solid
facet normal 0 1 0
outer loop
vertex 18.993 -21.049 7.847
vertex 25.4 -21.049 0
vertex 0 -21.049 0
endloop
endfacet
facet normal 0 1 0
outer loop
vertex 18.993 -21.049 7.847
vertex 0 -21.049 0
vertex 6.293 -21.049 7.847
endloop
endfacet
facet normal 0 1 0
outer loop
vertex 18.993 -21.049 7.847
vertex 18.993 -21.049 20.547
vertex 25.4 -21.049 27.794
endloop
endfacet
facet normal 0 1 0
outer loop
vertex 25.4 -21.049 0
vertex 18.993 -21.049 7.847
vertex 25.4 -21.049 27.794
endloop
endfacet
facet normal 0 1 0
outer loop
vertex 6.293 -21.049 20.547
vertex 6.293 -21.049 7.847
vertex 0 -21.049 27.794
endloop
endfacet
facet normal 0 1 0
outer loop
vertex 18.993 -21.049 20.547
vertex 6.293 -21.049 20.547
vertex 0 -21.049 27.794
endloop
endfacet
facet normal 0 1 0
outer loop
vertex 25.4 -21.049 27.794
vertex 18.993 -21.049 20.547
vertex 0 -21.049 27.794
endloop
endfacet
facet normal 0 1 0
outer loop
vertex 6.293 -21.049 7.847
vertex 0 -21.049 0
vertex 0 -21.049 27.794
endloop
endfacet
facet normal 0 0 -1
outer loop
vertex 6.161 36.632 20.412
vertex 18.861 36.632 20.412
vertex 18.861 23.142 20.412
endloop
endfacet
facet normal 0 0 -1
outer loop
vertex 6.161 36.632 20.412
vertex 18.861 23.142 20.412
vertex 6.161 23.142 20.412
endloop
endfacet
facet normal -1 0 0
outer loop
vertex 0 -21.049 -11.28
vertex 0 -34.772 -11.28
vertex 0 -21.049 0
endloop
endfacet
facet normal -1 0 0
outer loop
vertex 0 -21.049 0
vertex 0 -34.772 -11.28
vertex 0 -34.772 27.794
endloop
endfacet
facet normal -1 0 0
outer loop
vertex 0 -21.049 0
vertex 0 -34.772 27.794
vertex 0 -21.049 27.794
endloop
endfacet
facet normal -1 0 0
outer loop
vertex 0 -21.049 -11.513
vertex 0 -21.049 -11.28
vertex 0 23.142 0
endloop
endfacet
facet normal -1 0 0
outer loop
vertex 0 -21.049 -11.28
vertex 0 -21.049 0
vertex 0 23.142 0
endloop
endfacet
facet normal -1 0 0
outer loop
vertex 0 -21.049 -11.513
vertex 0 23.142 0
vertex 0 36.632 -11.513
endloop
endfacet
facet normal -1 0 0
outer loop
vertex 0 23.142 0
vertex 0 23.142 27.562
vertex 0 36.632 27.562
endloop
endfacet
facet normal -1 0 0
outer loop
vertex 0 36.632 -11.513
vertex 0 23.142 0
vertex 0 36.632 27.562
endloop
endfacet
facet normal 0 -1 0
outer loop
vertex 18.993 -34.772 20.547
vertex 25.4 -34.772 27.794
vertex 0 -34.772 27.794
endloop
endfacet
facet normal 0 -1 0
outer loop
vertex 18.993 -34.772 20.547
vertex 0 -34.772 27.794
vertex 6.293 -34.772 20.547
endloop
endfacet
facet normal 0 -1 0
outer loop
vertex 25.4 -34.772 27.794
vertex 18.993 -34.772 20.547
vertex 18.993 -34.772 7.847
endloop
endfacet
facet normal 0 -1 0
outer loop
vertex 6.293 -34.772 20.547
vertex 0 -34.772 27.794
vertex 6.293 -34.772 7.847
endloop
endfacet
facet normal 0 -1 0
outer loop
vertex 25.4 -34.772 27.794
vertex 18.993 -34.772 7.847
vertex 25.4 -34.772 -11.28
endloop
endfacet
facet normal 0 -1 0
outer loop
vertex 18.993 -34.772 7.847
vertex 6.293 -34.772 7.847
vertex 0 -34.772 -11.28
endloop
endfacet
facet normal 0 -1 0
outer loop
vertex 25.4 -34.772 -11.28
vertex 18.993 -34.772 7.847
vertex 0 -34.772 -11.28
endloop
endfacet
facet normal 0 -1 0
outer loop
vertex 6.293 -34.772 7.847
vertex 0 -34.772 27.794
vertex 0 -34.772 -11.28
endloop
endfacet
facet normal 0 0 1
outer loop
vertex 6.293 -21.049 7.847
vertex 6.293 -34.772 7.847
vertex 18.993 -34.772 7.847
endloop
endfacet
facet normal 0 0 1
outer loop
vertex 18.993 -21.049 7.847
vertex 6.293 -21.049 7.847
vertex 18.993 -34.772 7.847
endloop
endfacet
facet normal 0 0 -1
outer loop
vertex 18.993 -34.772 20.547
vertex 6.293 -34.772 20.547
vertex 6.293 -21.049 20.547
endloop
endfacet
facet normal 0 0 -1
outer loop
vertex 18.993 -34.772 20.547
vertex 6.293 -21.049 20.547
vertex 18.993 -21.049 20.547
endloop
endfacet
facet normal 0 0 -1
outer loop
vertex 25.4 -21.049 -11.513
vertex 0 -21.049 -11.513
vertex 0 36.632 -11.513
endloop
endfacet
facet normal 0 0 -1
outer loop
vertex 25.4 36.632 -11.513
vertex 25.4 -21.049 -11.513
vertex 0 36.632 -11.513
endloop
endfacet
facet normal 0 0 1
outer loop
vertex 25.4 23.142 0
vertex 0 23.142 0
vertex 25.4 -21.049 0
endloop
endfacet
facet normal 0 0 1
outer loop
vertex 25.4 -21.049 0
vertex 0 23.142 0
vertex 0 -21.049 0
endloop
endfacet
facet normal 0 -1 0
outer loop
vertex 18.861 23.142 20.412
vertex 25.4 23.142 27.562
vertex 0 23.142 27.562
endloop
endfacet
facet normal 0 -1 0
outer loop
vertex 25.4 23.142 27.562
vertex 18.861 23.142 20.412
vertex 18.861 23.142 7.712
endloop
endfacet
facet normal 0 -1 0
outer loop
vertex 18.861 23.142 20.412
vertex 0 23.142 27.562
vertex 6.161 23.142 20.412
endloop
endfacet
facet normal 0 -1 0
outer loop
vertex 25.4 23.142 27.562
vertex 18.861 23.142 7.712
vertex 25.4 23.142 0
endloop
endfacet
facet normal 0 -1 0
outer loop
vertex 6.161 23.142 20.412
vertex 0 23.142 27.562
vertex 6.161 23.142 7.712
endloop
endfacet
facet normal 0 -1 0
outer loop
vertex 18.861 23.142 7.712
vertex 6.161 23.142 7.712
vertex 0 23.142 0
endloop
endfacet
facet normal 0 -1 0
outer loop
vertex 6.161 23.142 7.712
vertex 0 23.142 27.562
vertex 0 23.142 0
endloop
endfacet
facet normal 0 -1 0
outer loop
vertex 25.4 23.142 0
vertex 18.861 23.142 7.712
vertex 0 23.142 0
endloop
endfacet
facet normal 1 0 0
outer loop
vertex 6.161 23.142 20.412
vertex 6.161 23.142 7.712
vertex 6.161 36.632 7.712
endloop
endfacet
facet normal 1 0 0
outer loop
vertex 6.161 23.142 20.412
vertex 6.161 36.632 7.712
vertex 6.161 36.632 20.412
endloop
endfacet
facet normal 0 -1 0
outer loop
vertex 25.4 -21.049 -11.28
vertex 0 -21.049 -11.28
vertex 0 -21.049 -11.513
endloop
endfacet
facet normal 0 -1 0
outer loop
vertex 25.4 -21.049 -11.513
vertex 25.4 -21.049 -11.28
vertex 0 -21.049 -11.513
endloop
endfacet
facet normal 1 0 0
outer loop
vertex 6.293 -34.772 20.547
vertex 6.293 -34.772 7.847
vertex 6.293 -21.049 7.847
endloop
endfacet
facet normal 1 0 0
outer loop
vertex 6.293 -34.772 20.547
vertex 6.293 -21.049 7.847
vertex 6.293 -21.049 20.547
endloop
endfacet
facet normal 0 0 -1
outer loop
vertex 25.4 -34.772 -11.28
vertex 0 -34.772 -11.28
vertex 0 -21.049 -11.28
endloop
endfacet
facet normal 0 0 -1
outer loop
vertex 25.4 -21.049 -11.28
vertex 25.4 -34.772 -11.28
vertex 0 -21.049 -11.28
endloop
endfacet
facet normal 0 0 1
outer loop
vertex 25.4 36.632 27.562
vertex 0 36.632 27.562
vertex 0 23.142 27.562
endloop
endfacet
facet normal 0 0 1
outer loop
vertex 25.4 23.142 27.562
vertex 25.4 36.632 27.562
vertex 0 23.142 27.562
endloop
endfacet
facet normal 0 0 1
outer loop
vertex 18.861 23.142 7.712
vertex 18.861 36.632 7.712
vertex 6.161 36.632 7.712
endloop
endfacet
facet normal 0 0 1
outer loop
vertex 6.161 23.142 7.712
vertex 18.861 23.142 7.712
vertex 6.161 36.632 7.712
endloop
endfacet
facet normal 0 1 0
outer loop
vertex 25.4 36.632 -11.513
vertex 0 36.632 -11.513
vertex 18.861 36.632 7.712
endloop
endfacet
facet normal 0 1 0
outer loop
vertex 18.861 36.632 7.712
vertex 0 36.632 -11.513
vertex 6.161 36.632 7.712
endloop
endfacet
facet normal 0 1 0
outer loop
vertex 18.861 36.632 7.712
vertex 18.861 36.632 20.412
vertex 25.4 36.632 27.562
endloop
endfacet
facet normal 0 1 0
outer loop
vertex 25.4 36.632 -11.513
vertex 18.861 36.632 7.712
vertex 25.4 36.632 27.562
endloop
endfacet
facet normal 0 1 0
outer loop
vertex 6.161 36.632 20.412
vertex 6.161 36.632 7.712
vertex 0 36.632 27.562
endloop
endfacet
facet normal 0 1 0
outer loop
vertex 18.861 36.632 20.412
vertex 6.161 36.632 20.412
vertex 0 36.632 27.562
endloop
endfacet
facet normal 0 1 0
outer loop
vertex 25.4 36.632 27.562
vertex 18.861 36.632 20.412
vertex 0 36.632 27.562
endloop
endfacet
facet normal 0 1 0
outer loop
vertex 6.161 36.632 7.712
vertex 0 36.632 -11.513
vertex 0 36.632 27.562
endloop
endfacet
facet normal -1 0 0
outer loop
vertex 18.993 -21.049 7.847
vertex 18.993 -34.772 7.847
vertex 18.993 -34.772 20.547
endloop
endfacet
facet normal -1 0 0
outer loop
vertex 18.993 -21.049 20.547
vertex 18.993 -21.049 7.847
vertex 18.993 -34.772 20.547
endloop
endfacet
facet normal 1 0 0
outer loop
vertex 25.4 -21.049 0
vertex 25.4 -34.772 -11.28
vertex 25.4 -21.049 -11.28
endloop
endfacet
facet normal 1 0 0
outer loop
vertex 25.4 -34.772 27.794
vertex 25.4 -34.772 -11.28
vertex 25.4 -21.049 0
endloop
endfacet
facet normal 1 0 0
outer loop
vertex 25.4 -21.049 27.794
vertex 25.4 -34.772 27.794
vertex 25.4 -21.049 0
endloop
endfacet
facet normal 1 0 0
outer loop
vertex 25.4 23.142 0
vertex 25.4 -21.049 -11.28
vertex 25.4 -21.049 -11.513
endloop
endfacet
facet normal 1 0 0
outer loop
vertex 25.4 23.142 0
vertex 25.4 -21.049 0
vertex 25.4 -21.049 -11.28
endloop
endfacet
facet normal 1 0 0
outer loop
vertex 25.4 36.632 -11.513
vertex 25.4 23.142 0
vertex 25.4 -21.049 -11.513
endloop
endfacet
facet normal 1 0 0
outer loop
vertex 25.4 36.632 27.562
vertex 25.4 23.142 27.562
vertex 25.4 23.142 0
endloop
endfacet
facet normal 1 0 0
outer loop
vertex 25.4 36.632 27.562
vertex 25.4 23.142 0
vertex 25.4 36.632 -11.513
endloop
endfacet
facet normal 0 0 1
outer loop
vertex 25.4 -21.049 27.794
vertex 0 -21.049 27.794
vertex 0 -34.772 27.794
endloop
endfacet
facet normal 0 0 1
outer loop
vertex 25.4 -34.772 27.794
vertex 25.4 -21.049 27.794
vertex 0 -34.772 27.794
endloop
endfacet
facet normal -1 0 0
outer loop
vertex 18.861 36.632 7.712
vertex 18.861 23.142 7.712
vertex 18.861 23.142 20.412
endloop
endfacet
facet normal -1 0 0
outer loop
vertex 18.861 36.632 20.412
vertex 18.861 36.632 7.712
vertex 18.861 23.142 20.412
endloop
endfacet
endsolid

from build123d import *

# Parameters (mm, degrees)
F1_DEPTH = 25.4
F2_DEPTH = 25.4
F3_W     = 12.7
F3_H     = 12.7
F4_DEPTH = 50.8
F5_W     = 12.7
F5_H     = 12.7
F6_DEPTH = 50.8


with BuildPart() as f1:
    # F0 (on Right) → F1 (new body)
    with BuildSketch(Plane.YZ):
        Polygon((-21.049142, 27.794171), (-34.771789, 27.794171), (-34.771789, -11.280479), (-21.049142, -11.280479), (-21.049142, -11.513066), (23.142429, -11.513066), (36.632486, -11.513066), (36.632486, 27.561583), (23.142429, 27.561583), (23.142429, 0), (-21.049142, 0), align=None)
    extrude(amount=F1_DEPTH)

    # F0 (on Right) → F2 (join)
    with BuildSketch(Plane.YZ):
        Polygon((-21.049142, 27.794171), (-34.771789, 27.794171), (-34.771789, -11.280479), (-21.049142, -11.280479), (-21.049142, -11.513066), (23.142429, -11.513066), (36.632486, -11.513066), (36.632486, 27.561583), (23.142429, 27.561583), (23.142429, 0), (-21.049142, 0), align=None)
    extrude(amount=F2_DEPTH)

    # F3 (on face) → F4 (cut)
    with BuildSketch(Plane.XZ.offset(34.771789)):
        with Locations((12.642618, 14.197407)):
            Rectangle(F3_W, F3_H)
    extrude(amount=-F4_DEPTH, mode=Mode.SUBTRACT)

    # F5 (on face) → F6 (cut)
    with BuildSketch(Plane(origin=(0, 36.632486, 0), x_dir=(-1, 0, 0), z_dir=(0, 1, 0))):
        with Locations((-12.511186, 14.061676)):
            Rectangle(F5_W, F5_H)
    extrude(amount=-F6_DEPTH, mode=Mode.SUBTRACT)


solid = f1.part
